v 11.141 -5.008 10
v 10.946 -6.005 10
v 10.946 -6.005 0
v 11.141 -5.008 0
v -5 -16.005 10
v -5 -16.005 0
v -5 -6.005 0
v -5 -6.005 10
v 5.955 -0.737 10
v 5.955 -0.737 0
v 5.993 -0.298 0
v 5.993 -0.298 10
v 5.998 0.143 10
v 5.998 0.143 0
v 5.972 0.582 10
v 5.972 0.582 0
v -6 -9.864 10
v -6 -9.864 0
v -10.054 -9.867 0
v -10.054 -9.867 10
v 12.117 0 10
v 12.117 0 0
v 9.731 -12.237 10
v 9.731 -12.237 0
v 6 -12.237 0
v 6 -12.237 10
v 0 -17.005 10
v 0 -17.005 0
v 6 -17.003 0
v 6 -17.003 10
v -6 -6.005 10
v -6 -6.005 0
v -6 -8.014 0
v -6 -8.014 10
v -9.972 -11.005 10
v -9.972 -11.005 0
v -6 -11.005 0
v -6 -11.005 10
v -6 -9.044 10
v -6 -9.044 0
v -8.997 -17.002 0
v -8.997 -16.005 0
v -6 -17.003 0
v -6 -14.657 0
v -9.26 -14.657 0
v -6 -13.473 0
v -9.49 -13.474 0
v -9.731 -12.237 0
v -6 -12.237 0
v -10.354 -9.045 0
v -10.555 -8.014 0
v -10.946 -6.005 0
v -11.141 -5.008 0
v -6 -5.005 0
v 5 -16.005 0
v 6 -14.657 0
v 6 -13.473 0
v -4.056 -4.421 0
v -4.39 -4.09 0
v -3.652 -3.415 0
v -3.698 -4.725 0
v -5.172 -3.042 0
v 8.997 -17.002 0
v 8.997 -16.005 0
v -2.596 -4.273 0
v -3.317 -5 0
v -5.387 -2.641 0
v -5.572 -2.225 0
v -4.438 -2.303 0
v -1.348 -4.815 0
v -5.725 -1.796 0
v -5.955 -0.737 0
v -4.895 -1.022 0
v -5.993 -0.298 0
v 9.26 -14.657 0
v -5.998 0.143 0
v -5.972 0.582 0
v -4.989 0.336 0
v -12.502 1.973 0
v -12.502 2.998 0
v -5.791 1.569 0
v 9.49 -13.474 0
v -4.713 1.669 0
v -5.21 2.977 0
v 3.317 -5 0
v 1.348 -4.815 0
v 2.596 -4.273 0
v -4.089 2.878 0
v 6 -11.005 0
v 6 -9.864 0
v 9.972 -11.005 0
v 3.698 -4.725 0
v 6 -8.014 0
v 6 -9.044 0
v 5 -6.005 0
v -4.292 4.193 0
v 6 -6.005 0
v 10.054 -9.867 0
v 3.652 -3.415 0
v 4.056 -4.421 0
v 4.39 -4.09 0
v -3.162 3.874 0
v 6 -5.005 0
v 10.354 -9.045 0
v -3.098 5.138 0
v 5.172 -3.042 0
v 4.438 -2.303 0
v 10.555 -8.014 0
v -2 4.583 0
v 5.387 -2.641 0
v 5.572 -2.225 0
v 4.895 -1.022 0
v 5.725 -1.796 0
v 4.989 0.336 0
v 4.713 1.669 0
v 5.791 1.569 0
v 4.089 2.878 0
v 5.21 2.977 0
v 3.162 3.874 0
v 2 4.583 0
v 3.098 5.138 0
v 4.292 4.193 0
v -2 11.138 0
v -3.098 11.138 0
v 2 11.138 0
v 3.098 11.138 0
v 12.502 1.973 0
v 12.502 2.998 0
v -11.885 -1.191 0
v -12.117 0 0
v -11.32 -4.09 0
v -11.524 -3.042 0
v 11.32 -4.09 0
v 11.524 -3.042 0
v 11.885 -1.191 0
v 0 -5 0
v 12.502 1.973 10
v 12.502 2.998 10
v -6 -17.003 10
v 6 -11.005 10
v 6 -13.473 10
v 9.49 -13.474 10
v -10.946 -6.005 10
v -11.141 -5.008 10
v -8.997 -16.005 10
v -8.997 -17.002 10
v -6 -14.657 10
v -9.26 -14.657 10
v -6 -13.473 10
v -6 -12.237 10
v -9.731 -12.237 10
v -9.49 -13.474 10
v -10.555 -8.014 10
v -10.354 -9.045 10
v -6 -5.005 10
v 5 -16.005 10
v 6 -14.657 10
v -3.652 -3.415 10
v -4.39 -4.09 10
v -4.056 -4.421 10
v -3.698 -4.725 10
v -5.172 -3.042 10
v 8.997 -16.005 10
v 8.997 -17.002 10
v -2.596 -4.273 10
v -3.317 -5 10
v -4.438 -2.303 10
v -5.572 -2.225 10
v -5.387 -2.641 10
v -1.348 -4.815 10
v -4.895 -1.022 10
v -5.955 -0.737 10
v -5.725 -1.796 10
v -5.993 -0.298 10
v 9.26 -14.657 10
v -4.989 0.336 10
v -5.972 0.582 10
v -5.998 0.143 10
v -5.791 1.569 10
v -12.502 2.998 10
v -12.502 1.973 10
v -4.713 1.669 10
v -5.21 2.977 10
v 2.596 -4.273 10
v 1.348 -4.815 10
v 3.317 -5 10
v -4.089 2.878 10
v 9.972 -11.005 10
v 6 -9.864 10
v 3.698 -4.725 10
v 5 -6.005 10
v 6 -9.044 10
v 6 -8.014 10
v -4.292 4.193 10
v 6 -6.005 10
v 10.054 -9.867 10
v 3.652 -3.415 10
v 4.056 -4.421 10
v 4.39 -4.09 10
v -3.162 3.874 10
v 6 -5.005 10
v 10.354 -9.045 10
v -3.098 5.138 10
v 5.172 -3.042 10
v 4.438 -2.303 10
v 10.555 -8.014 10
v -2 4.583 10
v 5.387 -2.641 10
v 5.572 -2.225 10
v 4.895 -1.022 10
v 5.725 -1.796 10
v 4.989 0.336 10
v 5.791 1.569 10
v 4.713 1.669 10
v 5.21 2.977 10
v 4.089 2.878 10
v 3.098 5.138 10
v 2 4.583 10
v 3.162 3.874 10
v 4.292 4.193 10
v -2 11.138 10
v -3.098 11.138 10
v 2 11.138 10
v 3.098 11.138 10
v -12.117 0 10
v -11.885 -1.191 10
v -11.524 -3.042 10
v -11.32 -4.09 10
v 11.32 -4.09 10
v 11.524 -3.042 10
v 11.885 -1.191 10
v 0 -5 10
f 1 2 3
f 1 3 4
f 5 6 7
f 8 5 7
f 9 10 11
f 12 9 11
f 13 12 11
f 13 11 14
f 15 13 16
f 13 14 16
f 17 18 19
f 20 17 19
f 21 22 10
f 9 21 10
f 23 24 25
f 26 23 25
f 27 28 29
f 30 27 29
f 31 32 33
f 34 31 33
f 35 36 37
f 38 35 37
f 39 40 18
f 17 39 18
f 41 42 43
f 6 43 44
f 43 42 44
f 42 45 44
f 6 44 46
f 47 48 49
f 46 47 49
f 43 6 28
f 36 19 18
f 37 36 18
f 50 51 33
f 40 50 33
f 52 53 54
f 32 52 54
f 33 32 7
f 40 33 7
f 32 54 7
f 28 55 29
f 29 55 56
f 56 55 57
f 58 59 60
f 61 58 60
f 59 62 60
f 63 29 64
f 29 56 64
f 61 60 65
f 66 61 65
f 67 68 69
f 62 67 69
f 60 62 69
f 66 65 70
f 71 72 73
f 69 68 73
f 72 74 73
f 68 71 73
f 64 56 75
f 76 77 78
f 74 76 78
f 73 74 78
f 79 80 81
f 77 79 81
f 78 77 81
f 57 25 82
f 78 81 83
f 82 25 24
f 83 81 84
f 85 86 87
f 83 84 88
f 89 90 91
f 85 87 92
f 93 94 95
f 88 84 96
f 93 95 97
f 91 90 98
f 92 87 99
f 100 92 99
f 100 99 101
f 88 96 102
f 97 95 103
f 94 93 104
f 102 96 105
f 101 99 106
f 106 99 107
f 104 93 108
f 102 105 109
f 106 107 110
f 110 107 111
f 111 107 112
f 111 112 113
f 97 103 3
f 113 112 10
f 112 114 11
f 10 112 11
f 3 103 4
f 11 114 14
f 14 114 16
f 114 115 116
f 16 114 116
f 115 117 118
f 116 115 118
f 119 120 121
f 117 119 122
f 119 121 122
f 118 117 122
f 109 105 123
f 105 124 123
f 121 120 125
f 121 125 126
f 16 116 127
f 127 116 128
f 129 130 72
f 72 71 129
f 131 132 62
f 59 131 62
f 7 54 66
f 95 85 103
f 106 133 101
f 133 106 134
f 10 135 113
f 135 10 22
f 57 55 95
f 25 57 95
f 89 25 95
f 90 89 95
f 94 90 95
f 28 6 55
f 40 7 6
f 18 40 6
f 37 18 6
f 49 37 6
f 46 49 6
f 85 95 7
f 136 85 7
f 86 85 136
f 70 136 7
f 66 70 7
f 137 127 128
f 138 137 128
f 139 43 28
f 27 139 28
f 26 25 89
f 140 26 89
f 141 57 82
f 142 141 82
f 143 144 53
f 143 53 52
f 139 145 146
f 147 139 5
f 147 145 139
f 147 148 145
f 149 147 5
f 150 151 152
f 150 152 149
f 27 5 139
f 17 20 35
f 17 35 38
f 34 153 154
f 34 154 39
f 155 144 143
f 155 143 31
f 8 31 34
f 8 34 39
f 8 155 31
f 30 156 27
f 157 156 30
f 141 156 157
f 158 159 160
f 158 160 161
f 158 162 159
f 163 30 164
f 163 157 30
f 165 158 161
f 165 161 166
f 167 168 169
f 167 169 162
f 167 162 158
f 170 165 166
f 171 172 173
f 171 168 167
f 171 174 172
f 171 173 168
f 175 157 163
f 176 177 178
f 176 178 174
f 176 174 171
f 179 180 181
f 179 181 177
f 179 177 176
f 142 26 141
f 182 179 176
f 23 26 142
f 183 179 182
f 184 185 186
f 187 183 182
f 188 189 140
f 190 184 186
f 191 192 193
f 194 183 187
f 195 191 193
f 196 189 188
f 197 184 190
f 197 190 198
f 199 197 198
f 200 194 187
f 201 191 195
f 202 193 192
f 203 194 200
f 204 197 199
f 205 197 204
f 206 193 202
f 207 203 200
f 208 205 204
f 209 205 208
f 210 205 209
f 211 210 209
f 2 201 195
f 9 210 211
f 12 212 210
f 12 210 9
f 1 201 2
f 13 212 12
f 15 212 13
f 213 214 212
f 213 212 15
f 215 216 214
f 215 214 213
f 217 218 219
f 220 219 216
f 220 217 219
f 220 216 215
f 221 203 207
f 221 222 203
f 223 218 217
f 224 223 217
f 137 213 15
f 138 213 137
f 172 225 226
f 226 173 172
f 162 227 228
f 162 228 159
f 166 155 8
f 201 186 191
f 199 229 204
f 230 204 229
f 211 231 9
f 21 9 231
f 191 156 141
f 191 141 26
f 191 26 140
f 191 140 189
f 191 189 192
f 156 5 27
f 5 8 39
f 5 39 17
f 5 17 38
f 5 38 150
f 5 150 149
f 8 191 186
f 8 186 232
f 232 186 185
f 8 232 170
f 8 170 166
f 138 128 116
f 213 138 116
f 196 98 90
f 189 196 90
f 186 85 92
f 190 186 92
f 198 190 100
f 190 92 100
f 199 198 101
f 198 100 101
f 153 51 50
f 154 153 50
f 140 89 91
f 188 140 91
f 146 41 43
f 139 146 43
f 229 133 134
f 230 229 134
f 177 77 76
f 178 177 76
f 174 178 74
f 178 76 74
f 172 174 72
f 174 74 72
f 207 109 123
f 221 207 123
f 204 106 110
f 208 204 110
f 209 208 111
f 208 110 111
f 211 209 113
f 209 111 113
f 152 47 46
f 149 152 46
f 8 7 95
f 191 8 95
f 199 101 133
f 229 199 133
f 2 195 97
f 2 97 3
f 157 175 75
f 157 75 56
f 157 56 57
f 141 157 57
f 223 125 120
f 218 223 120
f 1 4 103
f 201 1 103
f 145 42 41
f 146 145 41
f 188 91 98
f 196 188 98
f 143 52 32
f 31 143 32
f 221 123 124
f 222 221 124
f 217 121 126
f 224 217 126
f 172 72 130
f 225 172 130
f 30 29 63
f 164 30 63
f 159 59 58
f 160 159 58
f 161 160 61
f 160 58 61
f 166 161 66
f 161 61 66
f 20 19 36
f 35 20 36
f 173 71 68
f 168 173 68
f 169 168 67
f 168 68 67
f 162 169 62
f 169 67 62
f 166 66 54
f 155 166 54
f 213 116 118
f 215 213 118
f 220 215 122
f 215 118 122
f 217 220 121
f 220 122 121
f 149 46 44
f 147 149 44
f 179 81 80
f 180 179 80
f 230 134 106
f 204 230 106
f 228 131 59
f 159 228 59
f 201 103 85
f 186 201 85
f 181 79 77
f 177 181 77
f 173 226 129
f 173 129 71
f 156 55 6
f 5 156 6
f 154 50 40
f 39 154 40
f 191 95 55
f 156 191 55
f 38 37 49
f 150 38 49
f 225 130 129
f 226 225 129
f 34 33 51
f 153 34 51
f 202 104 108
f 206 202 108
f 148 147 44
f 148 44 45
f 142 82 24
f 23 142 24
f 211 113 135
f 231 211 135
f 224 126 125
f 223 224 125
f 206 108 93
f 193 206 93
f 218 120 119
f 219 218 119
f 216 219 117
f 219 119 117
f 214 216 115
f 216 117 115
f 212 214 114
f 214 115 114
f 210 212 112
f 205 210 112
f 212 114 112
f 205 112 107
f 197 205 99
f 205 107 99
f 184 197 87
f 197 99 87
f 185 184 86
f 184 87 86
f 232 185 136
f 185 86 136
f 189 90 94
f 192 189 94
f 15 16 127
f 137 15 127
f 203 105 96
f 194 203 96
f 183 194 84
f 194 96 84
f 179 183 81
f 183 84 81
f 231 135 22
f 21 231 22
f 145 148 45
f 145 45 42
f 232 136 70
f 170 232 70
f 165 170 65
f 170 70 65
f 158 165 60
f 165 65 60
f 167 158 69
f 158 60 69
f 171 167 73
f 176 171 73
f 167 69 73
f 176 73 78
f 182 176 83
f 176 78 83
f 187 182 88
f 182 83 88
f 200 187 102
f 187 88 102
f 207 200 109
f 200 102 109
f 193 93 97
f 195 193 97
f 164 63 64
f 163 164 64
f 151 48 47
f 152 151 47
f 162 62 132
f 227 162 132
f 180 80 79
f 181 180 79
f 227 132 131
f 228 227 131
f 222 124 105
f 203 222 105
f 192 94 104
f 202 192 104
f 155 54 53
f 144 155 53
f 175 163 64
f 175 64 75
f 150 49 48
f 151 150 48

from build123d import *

# Parameters (mm, degrees)
F1_DEPTH = 10


with BuildPart() as f1:
    # F0 (on Top) → F1 (new body)
    with BuildSketch(Plane.XY):
        with BuildLine():
            ThreePointArc((2, 4.582576), (4.894532, -1.021548), (0, -5))
            Line((0, -5), (0, -6.00455))
            Line((0, -6.00455), (5, -6.00455))
            Line((5, -6.00455), (5, -16.00455))
            Line((5, -16.00455), (0, -16.00455))
            Line((0, -16.00455), (0, -17.00455))
            Line((0, -17.00455), (6, -17.002946))
            Line((6, -17.002946), (8.996743, -17.002144))
            Line((8.996743, -17.002144), (8.996987, -16.00455))
            Line((8.996987, -16.00455), (9.259669, -14.657077))
            Line((9.259669, -14.657077), (6, -14.657077))
            Line((6, -14.657077), (6, -13.472727))
            Line((6, -13.472727), (9.490384, -13.473582))
            Line((9.490384, -13.473582), (9.731471, -12.236885))
            Line((9.731471, -12.236885), (6, -12.236885))
            Line((6, -12.236885), (6, -11.00455))
            Line((6, -11.00455), (9.971708, -11.00455))
            Line((9.971708, -11.00455), (10.053972, -9.866621))
            Line((10.053972, -9.866621), (6, -9.863548))
            Line((6, -9.863548), (6, -9.04429))
            Line((6, -9.04429), (10.353642, -9.045355))
            Line((10.353642, -9.045355), (10.554617, -8.01442))
            Line((10.554617, -8.01442), (6, -8.01442))
            Line((6, -8.01442), (6, -6.00455))
            Line((6, -6.00455), (10.946429, -6.00455))
            Line((10.946429, -6.00455), (11.140614, -5.008447))
            Line((11.140614, -5.008447), (6, -5.00455))
            Line((6, -5.00455), (3.316625, -5))
            ThreePointArc((3.316625, -5), (3.879995, -4.57664), (4.389841, -4.090146))
            ThreePointArc((4.389841, -4.090146), (4.809454, -3.587359), (5.171773, -3.041836))
            ThreePointArc((5.171773, -3.041836), (5.483753, -2.434842), (5.724784, -1.796345))
            ThreePointArc((5.724784, -1.796345), (5.863661, -1.271801), (5.954582, -0.736856))
            ThreePointArc((5.954582, -0.736856), (5.999496, -0.077783), (5.971684, 0.582233))
            ThreePointArc((5.971684, 0.582233), (5.902156, 1.079145), (5.791354, 1.56851))
            ThreePointArc((5.791354, 1.56851), (4.789612, 3.61381), (3.097802, 5.138446))
            Line((3.097802, 5.138446), (3.097802, 11.138446))
            Line((3.097802, 11.138446), (2, 11.138446))
            Line((2, 11.138446), (2, 4.582576))
        make_face()
        with BuildLine():
            Line((12.501639, 2.997855), (5.791354, 1.56851))
            ThreePointArc((5.791354, 1.56851), (5.902156, 1.079145), (5.971684, 0.582233))
            Line((5.971684, 0.582233), (12.501639, 1.973166))
            Line((12.501639, 1.973166), (12.501639, 2.997855))
        make_face()
        with BuildLine():
            Line((12.116982, 0), (5.954582, -0.736856))
            ThreePointArc((5.954582, -0.736856), (5.863661, -1.271801), (5.724784, -1.796345))
            Line((5.724784, -1.796345), (11.884799, -1.19102))
            Line((11.884799, -1.19102), (12.116982, 0))
        make_face()
        with BuildLine():
            Line((11.523993, -3.041836), (5.171773, -3.041836))
            ThreePointArc((5.171773, -3.041836), (4.809454, -3.587359), (4.389841, -4.090146))
            Line((4.389841, -4.090146), (11.319631, -4.090146))
            Line((11.319631, -4.090146), (11.523993, -3.041836))
        make_face()
        with BuildLine():
            Line((0, -6.00455), (0, -5))
            ThreePointArc((0, -5), (-4.894532, -1.021548), (-2, 4.582576))
            Line((-2, 4.582576), (-2, 11.138446))
            Line((-2, 11.138446), (-3.097802, 11.138446))
            Line((-3.097802, 11.138446), (-3.097802, 5.138446))
            ThreePointArc((-3.097802, 5.138446), (-4.789612, 3.61381), (-5.791354, 1.56851))
            ThreePointArc((-5.791354, 1.56851), (-5.902156, 1.079145), (-5.971684, 0.582233))
            ThreePointArc((-5.971684, 0.582233), (-5.999496, -0.077783), (-5.954582, -0.736856))
            ThreePointArc((-5.954582, -0.736856), (-5.863661, -1.271801), (-5.724784, -1.796345))
            ThreePointArc((-5.724784, -1.796345), (-5.483753, -2.434842), (-5.171773, -3.041836))
            ThreePointArc((-5.171773, -3.041836), (-4.809454, -3.587359), (-4.389841, -4.090146))
            ThreePointArc((-4.389841, -4.090146), (-3.879995, -4.57664), (-3.316625, -5))
            Line((-3.316625, -5), (-6, -5.00455))
            Line((-6, -5.00455), (-11.140614, -5.008447))
            Line((-11.140614, -5.008447), (-10.946429, -6.00455))
            Line((-10.946429, -6.00455), (-6, -6.00455))
            Line((-6, -6.00455), (-6, -8.01442))
            Line((-6, -8.01442), (-10.554617, -8.01442))
            Line((-10.554617, -8.01442), (-10.353642, -9.045355))
            Line((-10.353642, -9.045355), (-6, -9.04429))
            Line((-6, -9.04429), (-6, -9.863548))
            Line((-6, -9.863548), (-10.053972, -9.866621))
            Line((-10.053972, -9.866621), (-9.971708, -11.00455))
            Line((-9.971708, -11.00455), (-6, -11.00455))
            Line((-6, -11.00455), (-6, -12.236885))
            Line((-6, -12.236885), (-9.731471, -12.236885))
            Line((-9.731471, -12.236885), (-9.490384, -13.473582))
            Line((-9.490384, -13.473582), (-6, -13.472727))
            Line((-6, -13.472727), (-6, -14.657077))
            Line((-6, -14.657077), (-9.259669, -14.657077))
            Line((-9.259669, -14.657077), (-8.996987, -16.00455))
            Line((-8.996987, -16.00455), (-8.996743, -17.002144))
            Line((-8.996743, -17.002144), (-6, -17.002946))
            Line((-6, -17.002946), (0, -17.00455))
            Line((0, -17.00455), (0, -16.00455))
            Line((0, -16.00455), (-5, -16.00455))
            Line((-5, -16.00455), (-5, -6.00455))
            Line((-5, -6.00455), (0, -6.00455))
        make_face()
        with BuildLine():
            ThreePointArc((-5.971684, 0.582233), (-5.902156, 1.079145), (-5.791354, 1.56851))
            Line((-5.791354, 1.56851), (-12.501639, 2.997855))
            Line((-12.501639, 2.997855), (-12.501639, 1.973166))
            Line((-12.501639, 1.973166), (-5.971684, 0.582233))
        make_face()
        with BuildLine():
            ThreePointArc((-5.724784, -1.796345), (-5.863661, -1.271801), (-5.954582, -0.736856))
            Line((-5.954582, -0.736856), (-12.116982, 0))
            Line((-12.116982, 0), (-11.884799, -1.19102))
            Line((-11.884799, -1.19102), (-5.724784, -1.796345))
        make_face()
        with BuildLine():
            ThreePointArc((-4.389841, -4.090146), (-4.809454, -3.587359), (-5.171773, -3.041836))
            Line((-5.171773, -3.041836), (-11.523993, -3.041836))
            Line((-11.523993, -3.041836), (-11.319631, -4.090146))
            Line((-11.319631, -4.090146), (-4.389841, -4.090146))
        make_face()
    extrude(amount=F1_DEPTH)


solid = f1.part
